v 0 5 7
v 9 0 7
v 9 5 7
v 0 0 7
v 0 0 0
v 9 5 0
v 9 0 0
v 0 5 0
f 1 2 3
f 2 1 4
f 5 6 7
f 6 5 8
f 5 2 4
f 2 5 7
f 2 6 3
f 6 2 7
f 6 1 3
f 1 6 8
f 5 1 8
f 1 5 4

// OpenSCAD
// Generated by SolidPython 1.0.1 on 2020-07-29 00:46:55


cube(size = [9, 5, 7]);
/***********************************************
*********      SolidPython code:      **********
************************************************
 
# import packages: SolidPython
from solid import *
from solid.utils import *
from itertools import chain, combinations, permutations


class Resize:

    def __init__(self, scad_file):
        self.scad_file = scad_file
        #self.scad_file = import_scad(scad_file)
        # cone/cylinder param:
        self.r1 = 0
        self.r2 = 0
        self.h = 0
        # rectangular prism param:
        self.w = 0
        self.l = 0
        # ellipse param:
        self.r = 0

    # import OpenScad code (file name corresponds to shape)


    # classify shape + parameters
    def assign(self, param1, param2, param3):
        if self.scad_file == 'cone.scad':
            self.r1 = param1
            self.r2 = param2
            self.h = param3
        elif self.scad_file == 'cylinder.scad':
            self.r1 = param1
            self.r2 = param2
            self.h = param3
        elif self.scad_file == 'rectangularPrism.scad':
            self.h = param1
            self.l = param2
            self.w = param3
        else:
            self.r = param1
            self.h = param2

    # resize parameters
    def iterate(self):
        x = range(3, 20, 2)
        i = 1
        if self.scad_file == 'cone.scad':
            tempList = list(permutations(x, 2))
            for temp in tempList:
                param1 = temp[0]
                param2 = temp[1]
                filepath = 'produced_scad_files/' + 'cone' + str(param1) + '_' + str(param2) + '_' + '.scad'
                scad_render_to_file(cylinder(h=param1, r1=param2, r2=0), filepath)

        elif self.scad_file == 'cylinder.scad':
            tempList = list(permutations(x, 3))
            for temp in tempList:
                param1 = temp[0]
                param2 = temp[1]
                filepath = 'produced_scad_files/' + 'cylinder' + str(param1) + '_' + str(param2) + '_' + '.scad'
                scad_render_to_file(cylinder(h=param1, r1=param2, r2=param2), filepath)

        elif self.scad_file == 'rectangularPrism.scad':
            tempList = list(permutations(x, 3))
            for temp in tempList:
                param1 = temp[0]
                param2 = temp[1]
                param3 = temp[2]
                filepath = 'produced_scad_files/' + 'rectangularPrism' + str(param1) + '_' + str(param2) + '_' + str(
                    param3) + '.scad'
                scad_render_to_file(cube(size=(param1, param2, param3)), filepath)

        elif self.scad_file == 'ellipse.scad':
            tempList = list(permutations(x, 4))
            for temp in tempList:
                param1 = temp[0]
                param2 = temp[1]
                param3 = temp[2]
                param4 = temp[3]
                filepath = 'produced_scad_files/' + 'ellipse' + str(param1) + '_' + str(param2) + '_' + str(param3) + '_' + str(param4) + '.scad'
                scad_render_to_file(scale([param1, param2, param3])(sphere(r=param4)), filepath)

    def render_to_scadfile(self):
        scad_render_to_file(scad, 'example.scad') 
 
************************************************/
